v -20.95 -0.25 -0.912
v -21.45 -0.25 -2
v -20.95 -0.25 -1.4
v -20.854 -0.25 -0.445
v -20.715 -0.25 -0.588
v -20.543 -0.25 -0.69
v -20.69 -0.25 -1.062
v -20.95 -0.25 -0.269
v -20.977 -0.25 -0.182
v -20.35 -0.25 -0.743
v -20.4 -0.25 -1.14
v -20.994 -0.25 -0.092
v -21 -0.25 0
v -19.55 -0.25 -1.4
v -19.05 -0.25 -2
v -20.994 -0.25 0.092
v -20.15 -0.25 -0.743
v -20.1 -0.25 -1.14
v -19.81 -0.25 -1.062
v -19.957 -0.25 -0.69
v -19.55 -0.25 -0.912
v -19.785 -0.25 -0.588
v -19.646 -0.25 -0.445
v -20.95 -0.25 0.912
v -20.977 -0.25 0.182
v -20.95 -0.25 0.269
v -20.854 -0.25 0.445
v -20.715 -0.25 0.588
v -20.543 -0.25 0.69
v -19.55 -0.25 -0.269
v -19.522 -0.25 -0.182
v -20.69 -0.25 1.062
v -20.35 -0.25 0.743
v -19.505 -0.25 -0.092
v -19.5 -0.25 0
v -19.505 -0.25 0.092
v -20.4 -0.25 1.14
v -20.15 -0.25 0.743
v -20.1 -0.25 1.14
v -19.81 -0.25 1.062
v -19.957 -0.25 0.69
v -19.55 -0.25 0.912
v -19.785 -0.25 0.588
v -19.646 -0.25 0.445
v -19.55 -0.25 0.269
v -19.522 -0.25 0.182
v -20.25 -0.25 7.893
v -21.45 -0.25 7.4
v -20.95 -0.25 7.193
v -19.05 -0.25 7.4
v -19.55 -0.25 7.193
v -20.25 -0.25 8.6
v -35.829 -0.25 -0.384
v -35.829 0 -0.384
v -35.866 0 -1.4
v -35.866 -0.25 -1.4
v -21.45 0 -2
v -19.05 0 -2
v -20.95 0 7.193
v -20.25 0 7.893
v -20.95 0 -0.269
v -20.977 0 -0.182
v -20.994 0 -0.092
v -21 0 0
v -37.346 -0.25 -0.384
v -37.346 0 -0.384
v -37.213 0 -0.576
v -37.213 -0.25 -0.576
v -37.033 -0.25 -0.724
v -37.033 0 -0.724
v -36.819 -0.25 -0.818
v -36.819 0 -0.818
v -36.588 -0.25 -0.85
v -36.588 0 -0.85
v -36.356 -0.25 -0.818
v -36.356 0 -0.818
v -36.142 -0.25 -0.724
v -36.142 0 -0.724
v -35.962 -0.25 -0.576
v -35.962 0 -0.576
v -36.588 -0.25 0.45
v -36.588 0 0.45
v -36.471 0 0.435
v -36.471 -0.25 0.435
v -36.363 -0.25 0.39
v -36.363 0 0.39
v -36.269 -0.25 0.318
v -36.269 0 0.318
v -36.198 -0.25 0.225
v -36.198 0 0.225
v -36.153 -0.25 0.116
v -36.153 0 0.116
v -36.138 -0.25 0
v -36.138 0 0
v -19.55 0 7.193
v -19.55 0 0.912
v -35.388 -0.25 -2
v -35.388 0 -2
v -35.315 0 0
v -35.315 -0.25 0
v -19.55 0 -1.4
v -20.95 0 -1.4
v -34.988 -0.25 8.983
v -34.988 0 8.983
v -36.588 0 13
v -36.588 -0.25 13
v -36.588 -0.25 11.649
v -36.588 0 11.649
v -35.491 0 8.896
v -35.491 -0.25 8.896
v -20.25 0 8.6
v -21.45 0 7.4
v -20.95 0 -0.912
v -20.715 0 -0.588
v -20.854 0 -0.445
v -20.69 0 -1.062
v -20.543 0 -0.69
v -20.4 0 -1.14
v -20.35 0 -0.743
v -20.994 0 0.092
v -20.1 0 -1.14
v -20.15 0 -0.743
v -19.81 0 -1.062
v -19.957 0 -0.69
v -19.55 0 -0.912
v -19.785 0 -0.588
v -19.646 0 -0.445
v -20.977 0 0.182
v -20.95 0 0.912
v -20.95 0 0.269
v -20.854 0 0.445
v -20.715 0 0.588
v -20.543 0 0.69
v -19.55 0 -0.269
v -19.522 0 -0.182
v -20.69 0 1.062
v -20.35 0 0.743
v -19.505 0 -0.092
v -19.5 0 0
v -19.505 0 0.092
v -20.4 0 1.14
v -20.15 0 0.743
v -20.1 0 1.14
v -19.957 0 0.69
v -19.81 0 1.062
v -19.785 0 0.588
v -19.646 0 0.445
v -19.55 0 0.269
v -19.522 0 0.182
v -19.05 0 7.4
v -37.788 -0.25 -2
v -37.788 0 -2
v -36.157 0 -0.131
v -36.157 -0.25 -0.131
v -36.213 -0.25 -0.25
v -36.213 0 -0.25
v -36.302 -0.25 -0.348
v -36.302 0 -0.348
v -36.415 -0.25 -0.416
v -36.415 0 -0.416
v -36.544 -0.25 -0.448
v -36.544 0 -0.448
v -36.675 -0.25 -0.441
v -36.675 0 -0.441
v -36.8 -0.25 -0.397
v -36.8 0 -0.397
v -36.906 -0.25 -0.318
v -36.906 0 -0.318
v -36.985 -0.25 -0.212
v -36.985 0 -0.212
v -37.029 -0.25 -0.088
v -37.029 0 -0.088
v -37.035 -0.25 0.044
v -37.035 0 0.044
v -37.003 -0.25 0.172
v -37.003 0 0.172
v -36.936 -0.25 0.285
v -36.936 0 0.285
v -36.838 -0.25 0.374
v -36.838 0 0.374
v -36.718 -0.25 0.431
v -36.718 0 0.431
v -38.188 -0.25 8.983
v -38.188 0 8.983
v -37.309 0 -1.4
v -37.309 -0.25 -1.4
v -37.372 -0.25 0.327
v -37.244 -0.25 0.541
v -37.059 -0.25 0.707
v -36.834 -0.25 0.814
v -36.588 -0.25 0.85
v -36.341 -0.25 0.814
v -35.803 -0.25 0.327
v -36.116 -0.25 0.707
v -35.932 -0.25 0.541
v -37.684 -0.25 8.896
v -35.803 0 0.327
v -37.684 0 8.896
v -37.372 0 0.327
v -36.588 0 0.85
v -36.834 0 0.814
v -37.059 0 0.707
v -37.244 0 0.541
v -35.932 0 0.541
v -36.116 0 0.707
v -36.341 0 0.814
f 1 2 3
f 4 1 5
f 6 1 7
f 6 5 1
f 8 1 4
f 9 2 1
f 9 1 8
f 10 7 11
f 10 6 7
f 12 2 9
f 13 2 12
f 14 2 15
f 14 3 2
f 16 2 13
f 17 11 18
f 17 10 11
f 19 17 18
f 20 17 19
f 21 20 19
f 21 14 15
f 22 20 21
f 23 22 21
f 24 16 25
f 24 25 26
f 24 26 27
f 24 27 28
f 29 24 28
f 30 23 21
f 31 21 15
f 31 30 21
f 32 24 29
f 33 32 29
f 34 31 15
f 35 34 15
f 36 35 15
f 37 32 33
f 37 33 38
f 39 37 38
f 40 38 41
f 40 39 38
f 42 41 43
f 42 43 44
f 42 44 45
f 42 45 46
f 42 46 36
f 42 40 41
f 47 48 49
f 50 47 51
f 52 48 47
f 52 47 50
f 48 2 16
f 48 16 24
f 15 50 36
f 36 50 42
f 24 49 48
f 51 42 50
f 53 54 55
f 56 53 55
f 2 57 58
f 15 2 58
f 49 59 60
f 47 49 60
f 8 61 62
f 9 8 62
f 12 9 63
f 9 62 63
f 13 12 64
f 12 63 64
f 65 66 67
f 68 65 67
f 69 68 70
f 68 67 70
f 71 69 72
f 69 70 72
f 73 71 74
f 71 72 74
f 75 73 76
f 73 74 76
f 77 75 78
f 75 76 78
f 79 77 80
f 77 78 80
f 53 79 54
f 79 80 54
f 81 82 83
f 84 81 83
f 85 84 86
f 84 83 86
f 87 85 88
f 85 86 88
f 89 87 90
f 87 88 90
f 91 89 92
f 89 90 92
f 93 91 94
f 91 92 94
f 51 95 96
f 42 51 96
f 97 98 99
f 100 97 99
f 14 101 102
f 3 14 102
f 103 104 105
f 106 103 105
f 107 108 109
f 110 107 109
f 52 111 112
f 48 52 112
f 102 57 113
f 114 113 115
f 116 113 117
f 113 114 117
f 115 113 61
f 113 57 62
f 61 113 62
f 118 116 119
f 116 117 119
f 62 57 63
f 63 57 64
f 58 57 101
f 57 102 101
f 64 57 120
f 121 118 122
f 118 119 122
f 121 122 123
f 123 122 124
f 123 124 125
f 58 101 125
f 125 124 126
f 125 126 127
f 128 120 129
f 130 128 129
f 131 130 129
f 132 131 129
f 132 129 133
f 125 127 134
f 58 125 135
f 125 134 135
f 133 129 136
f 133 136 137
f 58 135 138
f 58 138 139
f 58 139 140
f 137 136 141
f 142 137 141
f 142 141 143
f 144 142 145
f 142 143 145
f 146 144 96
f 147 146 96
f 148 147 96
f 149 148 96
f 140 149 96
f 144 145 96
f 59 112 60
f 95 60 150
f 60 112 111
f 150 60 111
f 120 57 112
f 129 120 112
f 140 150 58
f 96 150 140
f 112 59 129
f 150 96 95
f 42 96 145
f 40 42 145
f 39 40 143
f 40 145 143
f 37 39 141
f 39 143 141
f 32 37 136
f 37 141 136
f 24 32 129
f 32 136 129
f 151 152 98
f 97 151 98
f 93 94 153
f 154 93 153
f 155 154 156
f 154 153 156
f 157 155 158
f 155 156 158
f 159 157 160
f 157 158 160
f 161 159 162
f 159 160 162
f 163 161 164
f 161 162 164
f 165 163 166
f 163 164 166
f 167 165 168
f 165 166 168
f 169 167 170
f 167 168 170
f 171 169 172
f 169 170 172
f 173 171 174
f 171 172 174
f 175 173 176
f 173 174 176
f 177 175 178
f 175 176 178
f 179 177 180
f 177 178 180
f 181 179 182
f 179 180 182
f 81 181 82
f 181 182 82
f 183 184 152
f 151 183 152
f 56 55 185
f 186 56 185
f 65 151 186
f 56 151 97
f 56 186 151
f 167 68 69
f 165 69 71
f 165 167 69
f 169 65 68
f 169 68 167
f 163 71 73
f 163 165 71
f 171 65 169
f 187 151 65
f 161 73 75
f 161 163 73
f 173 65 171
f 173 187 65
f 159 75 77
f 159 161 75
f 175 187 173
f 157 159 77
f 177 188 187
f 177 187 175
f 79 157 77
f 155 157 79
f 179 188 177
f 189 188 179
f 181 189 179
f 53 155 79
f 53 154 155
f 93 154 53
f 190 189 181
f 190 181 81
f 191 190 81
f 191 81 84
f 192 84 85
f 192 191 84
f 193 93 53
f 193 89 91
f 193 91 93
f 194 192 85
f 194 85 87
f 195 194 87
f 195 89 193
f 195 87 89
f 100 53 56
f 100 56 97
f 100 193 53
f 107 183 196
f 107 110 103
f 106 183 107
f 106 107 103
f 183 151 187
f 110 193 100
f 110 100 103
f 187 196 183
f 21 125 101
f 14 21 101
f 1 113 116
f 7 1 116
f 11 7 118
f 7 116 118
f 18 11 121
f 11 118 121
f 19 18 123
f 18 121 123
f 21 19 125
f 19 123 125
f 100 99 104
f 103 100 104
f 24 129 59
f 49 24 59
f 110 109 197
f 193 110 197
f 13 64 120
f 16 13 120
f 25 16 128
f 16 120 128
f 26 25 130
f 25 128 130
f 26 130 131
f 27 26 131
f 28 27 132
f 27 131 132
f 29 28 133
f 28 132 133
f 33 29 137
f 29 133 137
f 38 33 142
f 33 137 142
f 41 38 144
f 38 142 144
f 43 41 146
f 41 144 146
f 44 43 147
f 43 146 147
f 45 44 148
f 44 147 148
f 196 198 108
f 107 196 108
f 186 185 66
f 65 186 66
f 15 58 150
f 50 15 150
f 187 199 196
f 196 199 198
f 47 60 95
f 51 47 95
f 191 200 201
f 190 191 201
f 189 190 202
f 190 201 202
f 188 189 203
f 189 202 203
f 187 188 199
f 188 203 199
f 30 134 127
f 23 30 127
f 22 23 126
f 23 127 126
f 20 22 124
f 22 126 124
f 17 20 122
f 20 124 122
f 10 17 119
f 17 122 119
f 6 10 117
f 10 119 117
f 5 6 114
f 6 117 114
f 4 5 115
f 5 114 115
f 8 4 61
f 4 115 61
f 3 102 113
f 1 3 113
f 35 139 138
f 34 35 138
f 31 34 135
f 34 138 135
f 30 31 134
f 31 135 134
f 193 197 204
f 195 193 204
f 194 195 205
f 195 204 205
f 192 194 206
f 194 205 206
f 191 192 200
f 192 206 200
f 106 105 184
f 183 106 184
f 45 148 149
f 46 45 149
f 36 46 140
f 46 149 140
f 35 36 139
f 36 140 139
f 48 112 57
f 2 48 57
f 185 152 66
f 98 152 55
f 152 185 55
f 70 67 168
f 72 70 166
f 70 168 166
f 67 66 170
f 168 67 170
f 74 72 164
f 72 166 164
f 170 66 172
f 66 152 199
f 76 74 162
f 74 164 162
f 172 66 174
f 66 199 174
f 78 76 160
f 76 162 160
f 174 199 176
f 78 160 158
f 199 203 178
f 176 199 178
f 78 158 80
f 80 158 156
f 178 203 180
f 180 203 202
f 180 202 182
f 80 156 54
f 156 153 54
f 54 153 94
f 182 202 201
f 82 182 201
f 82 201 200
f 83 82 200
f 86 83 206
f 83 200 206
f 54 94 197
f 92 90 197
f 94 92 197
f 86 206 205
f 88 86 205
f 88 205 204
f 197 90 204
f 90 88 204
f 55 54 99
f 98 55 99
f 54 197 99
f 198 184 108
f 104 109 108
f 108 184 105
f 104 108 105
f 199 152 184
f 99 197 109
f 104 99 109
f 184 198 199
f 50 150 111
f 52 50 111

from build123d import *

# Parameters (mm, degrees)
F1_DEPTH = 0.25
F0_W     = 3
F0_H     = 0.6


# Not quite as in the source:
# - a feature names something its author has since deleted; it is built from what else it names


with BuildPart() as f1:
    # F0 (on Front) → F1 (new body)
    with BuildSketch(Plane.XZ):
        with BuildLine():
            Line((-21.4497518182, 1.5), (-21.4497518182, 0))
            Line((-21.4497518182, 0), (-21.3997518182, 0))
            ThreePointArc((-21.3997518182, 0), (-21.2811343854, 0.5086747487), (-20.9497518182, 0.9124143795))
            Line((-20.9497518182, 0.9124143795), (-20.9497518182, 1.5))
            Line((-20.9497518182, 1.5), (-20.9497518182, 7.1928932188))
            Line((-20.9497518182, 7.1928932188), (-20.2497518182, 7.8928932188))
            Line((-20.2497518182, 7.8928932188), (-19.5497518182, 7.1928932188))
            Line((-19.5497518182, 7.1928932188), (-19.5497518182, 1.5))
            Line((-19.5497518182, 1.5), (-19.5497518182, 0.9124143795))
            ThreePointArc((-19.5497518182, 0.9124143795), (-19.2183692509, 0.5086747487), (-19.0997518182, 0))
            ThreePointArc((-19.0997518182, 0), (-19.2183692509, -0.5086747487), (-19.5497518182, -0.9124143795))
            Line((-19.5497518182, -0.9124143795), (-19.5497518182, -1.4))
            Line((-19.5497518182, -1.4), (-19.0497518182, -1.4))
            Line((-19.0497518182, -1.4), (-19.0497518182, 1.5))
            Line((-19.0497518182, 1.5), (-19.0497518182, 7.4))
            Line((-19.0497518182, 7.4), (-20.2497518182, 8.6))
            Line((-20.2497518182, 8.6), (-21.4497518182, 7.4))
            Line((-21.4497518182, 7.4), (-21.4497518182, 1.5))
        make_face()
        with BuildLine():
            Line((-21.3997518182, 0), (-21.4497518182, 0))
            Line((-21.4497518182, 0), (-21.4497518182, -1.4))
            Line((-21.4497518182, -1.4), (-20.9497518182, -1.4))
            Line((-20.9497518182, -1.4), (-20.9497518182, -0.9124143795))
            ThreePointArc((-20.9497518182, -0.9124143795), (-21.2811343854, -0.5086747487), (-21.3997518182, 0))
        make_face()
        Polygon((-20.9497518182, -1.4), (-21.4497518182, -1.4), (-21.4497518182, -2), (-20.2497518182, -2), (-19.0497518182, -2), (-19.0497518182, -1.4), (-19.5497518182, -1.4), (-20.2497518182, -1.4), align=None)
        with BuildLine():
            ThreePointArc((-19.5497518182, 0.9124143795), (-20.2497518182, 1.15), (-20.9497518182, 0.9124143795))
            Line((-20.9497518182, 0.9124143795), (-20.9497518182, 0.2692582404))
            ThreePointArc((-20.9497518182, 0.2692582404), (-20.2497518182, 0.75), (-19.5497518182, 0.2692582404))
            Line((-19.5497518182, 0.2692582404), (-19.5497518182, 0.9124143795))
        make_face()
        with BuildLine():
            ThreePointArc((-19.0997518182, 0), (-19.2183692509, 0.5086747487), (-19.5497518182, 0.9124143795))
            Line((-19.5497518182, 0.9124143795), (-19.5497518182, 0.2692582404))
            ThreePointArc((-19.5497518182, 0.2692582404), (-19.512357758, 0.1369306394), (-19.4997518182, 0))
            ThreePointArc((-19.4997518182, 0), (-19.512357758, -0.1369306394), (-19.5497518182, -0.2692582404))
            Line((-19.5497518182, -0.2692582404), (-19.5497518182, -0.9124143795))
            ThreePointArc((-19.5497518182, -0.9124143795), (-19.2183692509, -0.5086747487), (-19.0997518182, 0))
        make_face()
        with BuildLine():
            Line((-20.9497518182, -0.2692582404), (-20.9497518182, -0.9124143795))
            ThreePointArc((-20.9497518182, -0.9124143795), (-20.2497518182, -1.15), (-19.5497518182, -0.9124143795))
            Line((-19.5497518182, -0.9124143795), (-19.5497518182, -0.2692582404))
            ThreePointArc((-19.5497518182, -0.2692582404), (-20.2497518182, -0.75), (-20.9497518182, -0.2692582404))
        make_face()
        with BuildLine():
            Line((-20.9997518182, 0), (-21.3997518182, 0))
            ThreePointArc((-21.3997518182, 0), (-21.2811343854, -0.5086747487), (-20.9497518182, -0.9124143795))
            Line((-20.9497518182, -0.9124143795), (-20.9497518182, -0.2692582404))
            ThreePointArc((-20.9497518182, -0.2692582404), (-20.9871458784, -0.1369306394), (-20.9997518182, 0))
        make_face()
        with BuildLine():
            ThreePointArc((-20.9497518182, 0.9124143795), (-21.2811343854, 0.5086747487), (-21.3997518182, 0))
            Line((-21.3997518182, 0), (-20.9997518182, 0))
            ThreePointArc((-20.9997518182, 0), (-20.9871458784, 0.1369306394), (-20.9497518182, 0.2692582404))
            Line((-20.9497518182, 0.2692582404), (-20.9497518182, 0.9124143795))
        make_face()
    extrude(amount=F1_DEPTH)


with BuildPart() as f1b:
    # F0 (on Front) → F1, piece 2 (new body)
    with BuildSketch(Plane.XZ):
        with BuildLine():
            ThreePointArc((-28.7187018186, 0.6873863542), (-29.0461968385, 0.4107919181), (-29.1687018186, 0))
            Line((-29.1687018186, 0), (-28.7687018186, 0))
            ThreePointArc((-28.7687018186, 0), (-28.7559702577, 0.0935414347), (-28.7187018186, 0.1802775638))
            Line((-28.7187018186, 0.1802775638), (-28.7187018186, 0.6873863542))
        make_face()
        with BuildLine():
            Line((-28.7687018186, 0), (-29.1687018186, 0))
            ThreePointArc((-29.1687018186, 0), (-29.0461968385, -0.4107919181), (-28.7187018186, -0.6873863542))
            Line((-28.7187018186, -0.6873863542), (-28.7187018186, -0.1802775638))
            ThreePointArc((-28.7187018186, -0.1802775638), (-28.7559702577, -0.0935414347), (-28.7687018186, 0))
        make_face()
        with BuildLine():
            Line((-28.7187018186, 12.9938064694), (-28.7187018186, 0.6873863542))
            ThreePointArc((-28.7187018186, 0.6873863542), (-28.5719340514, 0.7341797347), (-28.4187018186, 0.75))
            Line((-28.4187018186, 0.75), (-28.4187018186, 12.9938064694))
            Line((-28.4187018186, 12.9938064694), (-28.7187018186, 12.9938064694))
        make_face()
        with BuildLine():
            ThreePointArc((-28.4187018186, 0.75), (-28.5719340514, 0.7341797347), (-28.7187018186, 0.6873863542))
            Line((-28.7187018186, 0.6873863542), (-28.7187018186, 0.1802775638))
            ThreePointArc((-28.7187018186, 0.1802775638), (-28.5910428362, 0.3046285831), (-28.4187018186, 0.35))
            Line((-28.4187018186, 0.35), (-28.4187018186, 0.75))
        make_face()
        with BuildLine():
            Line((-28.7187018186, -0.1802775638), (-28.7187018186, -0.6873863542))
            ThreePointArc((-28.7187018186, -0.6873863542), (-28.5719340514, -0.7341797347), (-28.4187018186, -0.75))
            Line((-28.4187018186, -0.75), (-28.4187018186, -0.35))
            ThreePointArc((-28.4187018186, -0.35), (-28.5910428362, -0.3046285831), (-28.7187018186, -0.1802775638))
        make_face()
        with BuildLine():
            ThreePointArc((-28.4187018186, -0.75), (-28.5719340514, -0.7341797347), (-28.7187018186, -0.6873863542))
            Line((-28.7187018186, -0.6873863542), (-28.7187018186, -12.9938064694))
            Line((-28.7187018186, -12.9938064694), (-28.4187018186, -12.9938064694))
            Line((-28.4187018186, -12.9938064694), (-28.4187018186, -0.75))
        make_face()
        with BuildLine():
            Line((-28.4187018186, 12.9938064694), (-28.4187018186, 0.75))
            ThreePointArc((-28.4187018186, 0.75), (-28.2654695858, 0.7341797347), (-28.1187018186, 0.6873863542))
            Line((-28.1187018186, 0.6873863542), (-28.1187018186, 12.9938064694))
            Line((-28.1187018186, 12.9938064694), (-28.4187018186, 12.9938064694))
        make_face()
        with BuildLine():
            ThreePointArc((-28.1187018186, 0.6873863542), (-28.2654695858, 0.7341797347), (-28.4187018186, 0.75))
            Line((-28.4187018186, 0.75), (-28.4187018186, 0.35))
            ThreePointArc((-28.4187018186, 0.35), (-28.246360801, 0.3046285831), (-28.1187018186, 0.1802775638))
            Line((-28.1187018186, 0.1802775638), (-28.1187018186, 0.6873863542))
        make_face()
        with BuildLine():
            Line((-28.4187018186, -0.35), (-28.4187018186, -0.75))
            ThreePointArc((-28.4187018186, -0.75), (-28.2654695858, -0.7341797347), (-28.1187018186, -0.6873863542))
            Line((-28.1187018186, -0.6873863542), (-28.1187018186, -0.1802775638))
            ThreePointArc((-28.1187018186, -0.1802775638), (-28.246360801, -0.3046285831), (-28.4187018186, -0.35))
        make_face()
        with BuildLine():
            ThreePointArc((-28.1187018186, -0.6873863542), (-28.2654695858, -0.7341797347), (-28.4187018186, -0.75))
            Line((-28.4187018186, -0.75), (-28.4187018186, -12.9938064694))
            Line((-28.4187018186, -12.9938064694), (-28.1187018186, -12.9938064694))
            Line((-28.1187018186, -12.9938064694), (-28.1187018186, -0.6873863542))
        make_face()
        with BuildLine():
            ThreePointArc((-27.6687018186, 0), (-27.7912067987, 0.4107919181), (-28.1187018186, 0.6873863542))
            Line((-28.1187018186, 0.6873863542), (-28.1187018186, 0.1802775638))
            ThreePointArc((-28.1187018186, 0.1802775638), (-28.0814333795, 0.0935414347), (-28.0687018186, 0))
            Line((-28.0687018186, 0), (-27.6687018186, 0))
        make_face()
        with BuildLine():
            Line((-28.1187018186, -0.1802775638), (-28.1187018186, -0.6873863542))
            ThreePointArc((-28.1187018186, -0.6873863542), (-27.7912067987, -0.4107919181), (-27.6687018186, 0))
            Line((-27.6687018186, 0), (-28.0687018186, 0))
            ThreePointArc((-28.0687018186, 0), (-28.0814333795, -0.0935414347), (-28.1187018186, -0.1802775638))
        make_face()
    extrude(amount=F1_DEPTH)


with BuildPart() as f1c:
    # F0 (on Front) → F1, piece 3 (new body)
    with BuildSketch(Plane.XZ):
        with BuildLine():
            Line((-34.987651819, 8.9829219505), (-36.587651819, 13))
            Line((-36.587651819, 13), (-36.587651819, 11.6487521661))
            Line((-36.587651819, 11.6487521661), (-35.4911559916, 8.8958088415))
            Line((-35.4911559916, 8.8958088415), (-35.8032202993, 0.3273640038))
            ThreePointArc((-35.8032202993, 0.3273640038), (-35.7542051225, 0.1669329331), (-35.737651819, 0))
            Line((-35.737651819, 0), (-35.314811458, 0))
            Line((-35.314811458, 0), (-34.987651819, 8.9829219505))
        make_face()
        with BuildLine():
            Line((-36.587651819, 11.6487521661), (-36.587651819, 13))
            Line((-36.587651819, 13), (-38.187651819, 8.9829219505))
            Line((-38.187651819, 8.9829219505), (-37.787651819, -2))
            Line((-37.787651819, -2), (-36.587651819, -2))
            Line((-36.587651819, -2), (-35.387651819, -2))
            Line((-35.387651819, -2), (-35.314811458, 0))
            Line((-35.314811458, 0), (-35.737651819, 0))
            ThreePointArc((-35.737651819, 0), (-35.7608330268, -0.1971564985), (-35.829112254, -0.3835592892))
            Line((-35.829112254, -0.3835592892), (-35.8661312082, -1.4))
            Line((-35.8661312082, -1.4), (-36.587651819, -1.4))
            Line((-36.587651819, -1.4), (-37.3091724298, -1.4))
            Line((-37.3091724298, -1.4), (-37.346191384, -0.3835592892))
            ThreePointArc((-37.346191384, -0.3835592892), (-37.4370886466, -0.0309366426), (-37.3720833386, 0.3273640038))
            Line((-37.3720833386, 0.3273640038), (-37.6841476463, 8.8958088415))
            Line((-37.6841476463, 8.8958088415), (-36.587651819, 11.6487521661))
        make_face()
        with BuildLine():
            ThreePointArc((-35.829112254, -0.3835592892), (-35.7608330268, -0.1971564985), (-35.737651819, 0))
            Line((-35.737651819, 0), (-36.137651819, 0))
            ThreePointArc((-36.137651819, 0), (-36.9058498705, -0.3181980515), (-36.587651819, 0.45))
            Line((-36.587651819, 0.45), (-36.587651819, 0.85))
            ThreePointArc((-36.587651819, 0.85), (-37.0589482208, 0.7073752198), (-37.3720833386, 0.3273640038))
            ThreePointArc((-37.3720833386, 0.3273640038), (-37.4370886466, -0.0309366426), (-37.346191384, -0.3835592892))
            ThreePointArc((-37.346191384, -0.3835592892), (-36.587651819, -0.85), (-35.829112254, -0.3835592892))
        make_face()
        with BuildLine():
            Line((-36.137651819, 0), (-35.737651819, 0))
            ThreePointArc((-35.737651819, 0), (-35.7542051225, 0.1669329331), (-35.8032202993, 0.3273640038))
            ThreePointArc((-35.8032202993, 0.3273640038), (-36.1163554172, 0.7073752198), (-36.587651819, 0.85))
            Line((-36.587651819, 0.85), (-36.587651819, 0.45))
            ThreePointArc((-36.587651819, 0.45), (-36.2694537675, 0.3181980515), (-36.137651819, 0))
        make_face()
    extrude(amount=F1_DEPTH)


with BuildPart() as f1d:
    # F0 (on Front) → F1, piece 4 (new body)
    with BuildSketch(Plane.XZ):
        with Locations((-24.663922295, 11.3997036099)):
            Rectangle(F0_W, F0_H)
    extrude(amount=F1_DEPTH)


with BuildPart() as f1e:
    # F0 (on Front) → F1, piece 5 (new body)
    with BuildSketch(Plane.XZ):
        with Locations((-24.663922295, 9.8090009272)):
            Rectangle(F0_W, F0_H)
    extrude(amount=F1_DEPTH)


solid = Compound([f1.part, f1c.part])
